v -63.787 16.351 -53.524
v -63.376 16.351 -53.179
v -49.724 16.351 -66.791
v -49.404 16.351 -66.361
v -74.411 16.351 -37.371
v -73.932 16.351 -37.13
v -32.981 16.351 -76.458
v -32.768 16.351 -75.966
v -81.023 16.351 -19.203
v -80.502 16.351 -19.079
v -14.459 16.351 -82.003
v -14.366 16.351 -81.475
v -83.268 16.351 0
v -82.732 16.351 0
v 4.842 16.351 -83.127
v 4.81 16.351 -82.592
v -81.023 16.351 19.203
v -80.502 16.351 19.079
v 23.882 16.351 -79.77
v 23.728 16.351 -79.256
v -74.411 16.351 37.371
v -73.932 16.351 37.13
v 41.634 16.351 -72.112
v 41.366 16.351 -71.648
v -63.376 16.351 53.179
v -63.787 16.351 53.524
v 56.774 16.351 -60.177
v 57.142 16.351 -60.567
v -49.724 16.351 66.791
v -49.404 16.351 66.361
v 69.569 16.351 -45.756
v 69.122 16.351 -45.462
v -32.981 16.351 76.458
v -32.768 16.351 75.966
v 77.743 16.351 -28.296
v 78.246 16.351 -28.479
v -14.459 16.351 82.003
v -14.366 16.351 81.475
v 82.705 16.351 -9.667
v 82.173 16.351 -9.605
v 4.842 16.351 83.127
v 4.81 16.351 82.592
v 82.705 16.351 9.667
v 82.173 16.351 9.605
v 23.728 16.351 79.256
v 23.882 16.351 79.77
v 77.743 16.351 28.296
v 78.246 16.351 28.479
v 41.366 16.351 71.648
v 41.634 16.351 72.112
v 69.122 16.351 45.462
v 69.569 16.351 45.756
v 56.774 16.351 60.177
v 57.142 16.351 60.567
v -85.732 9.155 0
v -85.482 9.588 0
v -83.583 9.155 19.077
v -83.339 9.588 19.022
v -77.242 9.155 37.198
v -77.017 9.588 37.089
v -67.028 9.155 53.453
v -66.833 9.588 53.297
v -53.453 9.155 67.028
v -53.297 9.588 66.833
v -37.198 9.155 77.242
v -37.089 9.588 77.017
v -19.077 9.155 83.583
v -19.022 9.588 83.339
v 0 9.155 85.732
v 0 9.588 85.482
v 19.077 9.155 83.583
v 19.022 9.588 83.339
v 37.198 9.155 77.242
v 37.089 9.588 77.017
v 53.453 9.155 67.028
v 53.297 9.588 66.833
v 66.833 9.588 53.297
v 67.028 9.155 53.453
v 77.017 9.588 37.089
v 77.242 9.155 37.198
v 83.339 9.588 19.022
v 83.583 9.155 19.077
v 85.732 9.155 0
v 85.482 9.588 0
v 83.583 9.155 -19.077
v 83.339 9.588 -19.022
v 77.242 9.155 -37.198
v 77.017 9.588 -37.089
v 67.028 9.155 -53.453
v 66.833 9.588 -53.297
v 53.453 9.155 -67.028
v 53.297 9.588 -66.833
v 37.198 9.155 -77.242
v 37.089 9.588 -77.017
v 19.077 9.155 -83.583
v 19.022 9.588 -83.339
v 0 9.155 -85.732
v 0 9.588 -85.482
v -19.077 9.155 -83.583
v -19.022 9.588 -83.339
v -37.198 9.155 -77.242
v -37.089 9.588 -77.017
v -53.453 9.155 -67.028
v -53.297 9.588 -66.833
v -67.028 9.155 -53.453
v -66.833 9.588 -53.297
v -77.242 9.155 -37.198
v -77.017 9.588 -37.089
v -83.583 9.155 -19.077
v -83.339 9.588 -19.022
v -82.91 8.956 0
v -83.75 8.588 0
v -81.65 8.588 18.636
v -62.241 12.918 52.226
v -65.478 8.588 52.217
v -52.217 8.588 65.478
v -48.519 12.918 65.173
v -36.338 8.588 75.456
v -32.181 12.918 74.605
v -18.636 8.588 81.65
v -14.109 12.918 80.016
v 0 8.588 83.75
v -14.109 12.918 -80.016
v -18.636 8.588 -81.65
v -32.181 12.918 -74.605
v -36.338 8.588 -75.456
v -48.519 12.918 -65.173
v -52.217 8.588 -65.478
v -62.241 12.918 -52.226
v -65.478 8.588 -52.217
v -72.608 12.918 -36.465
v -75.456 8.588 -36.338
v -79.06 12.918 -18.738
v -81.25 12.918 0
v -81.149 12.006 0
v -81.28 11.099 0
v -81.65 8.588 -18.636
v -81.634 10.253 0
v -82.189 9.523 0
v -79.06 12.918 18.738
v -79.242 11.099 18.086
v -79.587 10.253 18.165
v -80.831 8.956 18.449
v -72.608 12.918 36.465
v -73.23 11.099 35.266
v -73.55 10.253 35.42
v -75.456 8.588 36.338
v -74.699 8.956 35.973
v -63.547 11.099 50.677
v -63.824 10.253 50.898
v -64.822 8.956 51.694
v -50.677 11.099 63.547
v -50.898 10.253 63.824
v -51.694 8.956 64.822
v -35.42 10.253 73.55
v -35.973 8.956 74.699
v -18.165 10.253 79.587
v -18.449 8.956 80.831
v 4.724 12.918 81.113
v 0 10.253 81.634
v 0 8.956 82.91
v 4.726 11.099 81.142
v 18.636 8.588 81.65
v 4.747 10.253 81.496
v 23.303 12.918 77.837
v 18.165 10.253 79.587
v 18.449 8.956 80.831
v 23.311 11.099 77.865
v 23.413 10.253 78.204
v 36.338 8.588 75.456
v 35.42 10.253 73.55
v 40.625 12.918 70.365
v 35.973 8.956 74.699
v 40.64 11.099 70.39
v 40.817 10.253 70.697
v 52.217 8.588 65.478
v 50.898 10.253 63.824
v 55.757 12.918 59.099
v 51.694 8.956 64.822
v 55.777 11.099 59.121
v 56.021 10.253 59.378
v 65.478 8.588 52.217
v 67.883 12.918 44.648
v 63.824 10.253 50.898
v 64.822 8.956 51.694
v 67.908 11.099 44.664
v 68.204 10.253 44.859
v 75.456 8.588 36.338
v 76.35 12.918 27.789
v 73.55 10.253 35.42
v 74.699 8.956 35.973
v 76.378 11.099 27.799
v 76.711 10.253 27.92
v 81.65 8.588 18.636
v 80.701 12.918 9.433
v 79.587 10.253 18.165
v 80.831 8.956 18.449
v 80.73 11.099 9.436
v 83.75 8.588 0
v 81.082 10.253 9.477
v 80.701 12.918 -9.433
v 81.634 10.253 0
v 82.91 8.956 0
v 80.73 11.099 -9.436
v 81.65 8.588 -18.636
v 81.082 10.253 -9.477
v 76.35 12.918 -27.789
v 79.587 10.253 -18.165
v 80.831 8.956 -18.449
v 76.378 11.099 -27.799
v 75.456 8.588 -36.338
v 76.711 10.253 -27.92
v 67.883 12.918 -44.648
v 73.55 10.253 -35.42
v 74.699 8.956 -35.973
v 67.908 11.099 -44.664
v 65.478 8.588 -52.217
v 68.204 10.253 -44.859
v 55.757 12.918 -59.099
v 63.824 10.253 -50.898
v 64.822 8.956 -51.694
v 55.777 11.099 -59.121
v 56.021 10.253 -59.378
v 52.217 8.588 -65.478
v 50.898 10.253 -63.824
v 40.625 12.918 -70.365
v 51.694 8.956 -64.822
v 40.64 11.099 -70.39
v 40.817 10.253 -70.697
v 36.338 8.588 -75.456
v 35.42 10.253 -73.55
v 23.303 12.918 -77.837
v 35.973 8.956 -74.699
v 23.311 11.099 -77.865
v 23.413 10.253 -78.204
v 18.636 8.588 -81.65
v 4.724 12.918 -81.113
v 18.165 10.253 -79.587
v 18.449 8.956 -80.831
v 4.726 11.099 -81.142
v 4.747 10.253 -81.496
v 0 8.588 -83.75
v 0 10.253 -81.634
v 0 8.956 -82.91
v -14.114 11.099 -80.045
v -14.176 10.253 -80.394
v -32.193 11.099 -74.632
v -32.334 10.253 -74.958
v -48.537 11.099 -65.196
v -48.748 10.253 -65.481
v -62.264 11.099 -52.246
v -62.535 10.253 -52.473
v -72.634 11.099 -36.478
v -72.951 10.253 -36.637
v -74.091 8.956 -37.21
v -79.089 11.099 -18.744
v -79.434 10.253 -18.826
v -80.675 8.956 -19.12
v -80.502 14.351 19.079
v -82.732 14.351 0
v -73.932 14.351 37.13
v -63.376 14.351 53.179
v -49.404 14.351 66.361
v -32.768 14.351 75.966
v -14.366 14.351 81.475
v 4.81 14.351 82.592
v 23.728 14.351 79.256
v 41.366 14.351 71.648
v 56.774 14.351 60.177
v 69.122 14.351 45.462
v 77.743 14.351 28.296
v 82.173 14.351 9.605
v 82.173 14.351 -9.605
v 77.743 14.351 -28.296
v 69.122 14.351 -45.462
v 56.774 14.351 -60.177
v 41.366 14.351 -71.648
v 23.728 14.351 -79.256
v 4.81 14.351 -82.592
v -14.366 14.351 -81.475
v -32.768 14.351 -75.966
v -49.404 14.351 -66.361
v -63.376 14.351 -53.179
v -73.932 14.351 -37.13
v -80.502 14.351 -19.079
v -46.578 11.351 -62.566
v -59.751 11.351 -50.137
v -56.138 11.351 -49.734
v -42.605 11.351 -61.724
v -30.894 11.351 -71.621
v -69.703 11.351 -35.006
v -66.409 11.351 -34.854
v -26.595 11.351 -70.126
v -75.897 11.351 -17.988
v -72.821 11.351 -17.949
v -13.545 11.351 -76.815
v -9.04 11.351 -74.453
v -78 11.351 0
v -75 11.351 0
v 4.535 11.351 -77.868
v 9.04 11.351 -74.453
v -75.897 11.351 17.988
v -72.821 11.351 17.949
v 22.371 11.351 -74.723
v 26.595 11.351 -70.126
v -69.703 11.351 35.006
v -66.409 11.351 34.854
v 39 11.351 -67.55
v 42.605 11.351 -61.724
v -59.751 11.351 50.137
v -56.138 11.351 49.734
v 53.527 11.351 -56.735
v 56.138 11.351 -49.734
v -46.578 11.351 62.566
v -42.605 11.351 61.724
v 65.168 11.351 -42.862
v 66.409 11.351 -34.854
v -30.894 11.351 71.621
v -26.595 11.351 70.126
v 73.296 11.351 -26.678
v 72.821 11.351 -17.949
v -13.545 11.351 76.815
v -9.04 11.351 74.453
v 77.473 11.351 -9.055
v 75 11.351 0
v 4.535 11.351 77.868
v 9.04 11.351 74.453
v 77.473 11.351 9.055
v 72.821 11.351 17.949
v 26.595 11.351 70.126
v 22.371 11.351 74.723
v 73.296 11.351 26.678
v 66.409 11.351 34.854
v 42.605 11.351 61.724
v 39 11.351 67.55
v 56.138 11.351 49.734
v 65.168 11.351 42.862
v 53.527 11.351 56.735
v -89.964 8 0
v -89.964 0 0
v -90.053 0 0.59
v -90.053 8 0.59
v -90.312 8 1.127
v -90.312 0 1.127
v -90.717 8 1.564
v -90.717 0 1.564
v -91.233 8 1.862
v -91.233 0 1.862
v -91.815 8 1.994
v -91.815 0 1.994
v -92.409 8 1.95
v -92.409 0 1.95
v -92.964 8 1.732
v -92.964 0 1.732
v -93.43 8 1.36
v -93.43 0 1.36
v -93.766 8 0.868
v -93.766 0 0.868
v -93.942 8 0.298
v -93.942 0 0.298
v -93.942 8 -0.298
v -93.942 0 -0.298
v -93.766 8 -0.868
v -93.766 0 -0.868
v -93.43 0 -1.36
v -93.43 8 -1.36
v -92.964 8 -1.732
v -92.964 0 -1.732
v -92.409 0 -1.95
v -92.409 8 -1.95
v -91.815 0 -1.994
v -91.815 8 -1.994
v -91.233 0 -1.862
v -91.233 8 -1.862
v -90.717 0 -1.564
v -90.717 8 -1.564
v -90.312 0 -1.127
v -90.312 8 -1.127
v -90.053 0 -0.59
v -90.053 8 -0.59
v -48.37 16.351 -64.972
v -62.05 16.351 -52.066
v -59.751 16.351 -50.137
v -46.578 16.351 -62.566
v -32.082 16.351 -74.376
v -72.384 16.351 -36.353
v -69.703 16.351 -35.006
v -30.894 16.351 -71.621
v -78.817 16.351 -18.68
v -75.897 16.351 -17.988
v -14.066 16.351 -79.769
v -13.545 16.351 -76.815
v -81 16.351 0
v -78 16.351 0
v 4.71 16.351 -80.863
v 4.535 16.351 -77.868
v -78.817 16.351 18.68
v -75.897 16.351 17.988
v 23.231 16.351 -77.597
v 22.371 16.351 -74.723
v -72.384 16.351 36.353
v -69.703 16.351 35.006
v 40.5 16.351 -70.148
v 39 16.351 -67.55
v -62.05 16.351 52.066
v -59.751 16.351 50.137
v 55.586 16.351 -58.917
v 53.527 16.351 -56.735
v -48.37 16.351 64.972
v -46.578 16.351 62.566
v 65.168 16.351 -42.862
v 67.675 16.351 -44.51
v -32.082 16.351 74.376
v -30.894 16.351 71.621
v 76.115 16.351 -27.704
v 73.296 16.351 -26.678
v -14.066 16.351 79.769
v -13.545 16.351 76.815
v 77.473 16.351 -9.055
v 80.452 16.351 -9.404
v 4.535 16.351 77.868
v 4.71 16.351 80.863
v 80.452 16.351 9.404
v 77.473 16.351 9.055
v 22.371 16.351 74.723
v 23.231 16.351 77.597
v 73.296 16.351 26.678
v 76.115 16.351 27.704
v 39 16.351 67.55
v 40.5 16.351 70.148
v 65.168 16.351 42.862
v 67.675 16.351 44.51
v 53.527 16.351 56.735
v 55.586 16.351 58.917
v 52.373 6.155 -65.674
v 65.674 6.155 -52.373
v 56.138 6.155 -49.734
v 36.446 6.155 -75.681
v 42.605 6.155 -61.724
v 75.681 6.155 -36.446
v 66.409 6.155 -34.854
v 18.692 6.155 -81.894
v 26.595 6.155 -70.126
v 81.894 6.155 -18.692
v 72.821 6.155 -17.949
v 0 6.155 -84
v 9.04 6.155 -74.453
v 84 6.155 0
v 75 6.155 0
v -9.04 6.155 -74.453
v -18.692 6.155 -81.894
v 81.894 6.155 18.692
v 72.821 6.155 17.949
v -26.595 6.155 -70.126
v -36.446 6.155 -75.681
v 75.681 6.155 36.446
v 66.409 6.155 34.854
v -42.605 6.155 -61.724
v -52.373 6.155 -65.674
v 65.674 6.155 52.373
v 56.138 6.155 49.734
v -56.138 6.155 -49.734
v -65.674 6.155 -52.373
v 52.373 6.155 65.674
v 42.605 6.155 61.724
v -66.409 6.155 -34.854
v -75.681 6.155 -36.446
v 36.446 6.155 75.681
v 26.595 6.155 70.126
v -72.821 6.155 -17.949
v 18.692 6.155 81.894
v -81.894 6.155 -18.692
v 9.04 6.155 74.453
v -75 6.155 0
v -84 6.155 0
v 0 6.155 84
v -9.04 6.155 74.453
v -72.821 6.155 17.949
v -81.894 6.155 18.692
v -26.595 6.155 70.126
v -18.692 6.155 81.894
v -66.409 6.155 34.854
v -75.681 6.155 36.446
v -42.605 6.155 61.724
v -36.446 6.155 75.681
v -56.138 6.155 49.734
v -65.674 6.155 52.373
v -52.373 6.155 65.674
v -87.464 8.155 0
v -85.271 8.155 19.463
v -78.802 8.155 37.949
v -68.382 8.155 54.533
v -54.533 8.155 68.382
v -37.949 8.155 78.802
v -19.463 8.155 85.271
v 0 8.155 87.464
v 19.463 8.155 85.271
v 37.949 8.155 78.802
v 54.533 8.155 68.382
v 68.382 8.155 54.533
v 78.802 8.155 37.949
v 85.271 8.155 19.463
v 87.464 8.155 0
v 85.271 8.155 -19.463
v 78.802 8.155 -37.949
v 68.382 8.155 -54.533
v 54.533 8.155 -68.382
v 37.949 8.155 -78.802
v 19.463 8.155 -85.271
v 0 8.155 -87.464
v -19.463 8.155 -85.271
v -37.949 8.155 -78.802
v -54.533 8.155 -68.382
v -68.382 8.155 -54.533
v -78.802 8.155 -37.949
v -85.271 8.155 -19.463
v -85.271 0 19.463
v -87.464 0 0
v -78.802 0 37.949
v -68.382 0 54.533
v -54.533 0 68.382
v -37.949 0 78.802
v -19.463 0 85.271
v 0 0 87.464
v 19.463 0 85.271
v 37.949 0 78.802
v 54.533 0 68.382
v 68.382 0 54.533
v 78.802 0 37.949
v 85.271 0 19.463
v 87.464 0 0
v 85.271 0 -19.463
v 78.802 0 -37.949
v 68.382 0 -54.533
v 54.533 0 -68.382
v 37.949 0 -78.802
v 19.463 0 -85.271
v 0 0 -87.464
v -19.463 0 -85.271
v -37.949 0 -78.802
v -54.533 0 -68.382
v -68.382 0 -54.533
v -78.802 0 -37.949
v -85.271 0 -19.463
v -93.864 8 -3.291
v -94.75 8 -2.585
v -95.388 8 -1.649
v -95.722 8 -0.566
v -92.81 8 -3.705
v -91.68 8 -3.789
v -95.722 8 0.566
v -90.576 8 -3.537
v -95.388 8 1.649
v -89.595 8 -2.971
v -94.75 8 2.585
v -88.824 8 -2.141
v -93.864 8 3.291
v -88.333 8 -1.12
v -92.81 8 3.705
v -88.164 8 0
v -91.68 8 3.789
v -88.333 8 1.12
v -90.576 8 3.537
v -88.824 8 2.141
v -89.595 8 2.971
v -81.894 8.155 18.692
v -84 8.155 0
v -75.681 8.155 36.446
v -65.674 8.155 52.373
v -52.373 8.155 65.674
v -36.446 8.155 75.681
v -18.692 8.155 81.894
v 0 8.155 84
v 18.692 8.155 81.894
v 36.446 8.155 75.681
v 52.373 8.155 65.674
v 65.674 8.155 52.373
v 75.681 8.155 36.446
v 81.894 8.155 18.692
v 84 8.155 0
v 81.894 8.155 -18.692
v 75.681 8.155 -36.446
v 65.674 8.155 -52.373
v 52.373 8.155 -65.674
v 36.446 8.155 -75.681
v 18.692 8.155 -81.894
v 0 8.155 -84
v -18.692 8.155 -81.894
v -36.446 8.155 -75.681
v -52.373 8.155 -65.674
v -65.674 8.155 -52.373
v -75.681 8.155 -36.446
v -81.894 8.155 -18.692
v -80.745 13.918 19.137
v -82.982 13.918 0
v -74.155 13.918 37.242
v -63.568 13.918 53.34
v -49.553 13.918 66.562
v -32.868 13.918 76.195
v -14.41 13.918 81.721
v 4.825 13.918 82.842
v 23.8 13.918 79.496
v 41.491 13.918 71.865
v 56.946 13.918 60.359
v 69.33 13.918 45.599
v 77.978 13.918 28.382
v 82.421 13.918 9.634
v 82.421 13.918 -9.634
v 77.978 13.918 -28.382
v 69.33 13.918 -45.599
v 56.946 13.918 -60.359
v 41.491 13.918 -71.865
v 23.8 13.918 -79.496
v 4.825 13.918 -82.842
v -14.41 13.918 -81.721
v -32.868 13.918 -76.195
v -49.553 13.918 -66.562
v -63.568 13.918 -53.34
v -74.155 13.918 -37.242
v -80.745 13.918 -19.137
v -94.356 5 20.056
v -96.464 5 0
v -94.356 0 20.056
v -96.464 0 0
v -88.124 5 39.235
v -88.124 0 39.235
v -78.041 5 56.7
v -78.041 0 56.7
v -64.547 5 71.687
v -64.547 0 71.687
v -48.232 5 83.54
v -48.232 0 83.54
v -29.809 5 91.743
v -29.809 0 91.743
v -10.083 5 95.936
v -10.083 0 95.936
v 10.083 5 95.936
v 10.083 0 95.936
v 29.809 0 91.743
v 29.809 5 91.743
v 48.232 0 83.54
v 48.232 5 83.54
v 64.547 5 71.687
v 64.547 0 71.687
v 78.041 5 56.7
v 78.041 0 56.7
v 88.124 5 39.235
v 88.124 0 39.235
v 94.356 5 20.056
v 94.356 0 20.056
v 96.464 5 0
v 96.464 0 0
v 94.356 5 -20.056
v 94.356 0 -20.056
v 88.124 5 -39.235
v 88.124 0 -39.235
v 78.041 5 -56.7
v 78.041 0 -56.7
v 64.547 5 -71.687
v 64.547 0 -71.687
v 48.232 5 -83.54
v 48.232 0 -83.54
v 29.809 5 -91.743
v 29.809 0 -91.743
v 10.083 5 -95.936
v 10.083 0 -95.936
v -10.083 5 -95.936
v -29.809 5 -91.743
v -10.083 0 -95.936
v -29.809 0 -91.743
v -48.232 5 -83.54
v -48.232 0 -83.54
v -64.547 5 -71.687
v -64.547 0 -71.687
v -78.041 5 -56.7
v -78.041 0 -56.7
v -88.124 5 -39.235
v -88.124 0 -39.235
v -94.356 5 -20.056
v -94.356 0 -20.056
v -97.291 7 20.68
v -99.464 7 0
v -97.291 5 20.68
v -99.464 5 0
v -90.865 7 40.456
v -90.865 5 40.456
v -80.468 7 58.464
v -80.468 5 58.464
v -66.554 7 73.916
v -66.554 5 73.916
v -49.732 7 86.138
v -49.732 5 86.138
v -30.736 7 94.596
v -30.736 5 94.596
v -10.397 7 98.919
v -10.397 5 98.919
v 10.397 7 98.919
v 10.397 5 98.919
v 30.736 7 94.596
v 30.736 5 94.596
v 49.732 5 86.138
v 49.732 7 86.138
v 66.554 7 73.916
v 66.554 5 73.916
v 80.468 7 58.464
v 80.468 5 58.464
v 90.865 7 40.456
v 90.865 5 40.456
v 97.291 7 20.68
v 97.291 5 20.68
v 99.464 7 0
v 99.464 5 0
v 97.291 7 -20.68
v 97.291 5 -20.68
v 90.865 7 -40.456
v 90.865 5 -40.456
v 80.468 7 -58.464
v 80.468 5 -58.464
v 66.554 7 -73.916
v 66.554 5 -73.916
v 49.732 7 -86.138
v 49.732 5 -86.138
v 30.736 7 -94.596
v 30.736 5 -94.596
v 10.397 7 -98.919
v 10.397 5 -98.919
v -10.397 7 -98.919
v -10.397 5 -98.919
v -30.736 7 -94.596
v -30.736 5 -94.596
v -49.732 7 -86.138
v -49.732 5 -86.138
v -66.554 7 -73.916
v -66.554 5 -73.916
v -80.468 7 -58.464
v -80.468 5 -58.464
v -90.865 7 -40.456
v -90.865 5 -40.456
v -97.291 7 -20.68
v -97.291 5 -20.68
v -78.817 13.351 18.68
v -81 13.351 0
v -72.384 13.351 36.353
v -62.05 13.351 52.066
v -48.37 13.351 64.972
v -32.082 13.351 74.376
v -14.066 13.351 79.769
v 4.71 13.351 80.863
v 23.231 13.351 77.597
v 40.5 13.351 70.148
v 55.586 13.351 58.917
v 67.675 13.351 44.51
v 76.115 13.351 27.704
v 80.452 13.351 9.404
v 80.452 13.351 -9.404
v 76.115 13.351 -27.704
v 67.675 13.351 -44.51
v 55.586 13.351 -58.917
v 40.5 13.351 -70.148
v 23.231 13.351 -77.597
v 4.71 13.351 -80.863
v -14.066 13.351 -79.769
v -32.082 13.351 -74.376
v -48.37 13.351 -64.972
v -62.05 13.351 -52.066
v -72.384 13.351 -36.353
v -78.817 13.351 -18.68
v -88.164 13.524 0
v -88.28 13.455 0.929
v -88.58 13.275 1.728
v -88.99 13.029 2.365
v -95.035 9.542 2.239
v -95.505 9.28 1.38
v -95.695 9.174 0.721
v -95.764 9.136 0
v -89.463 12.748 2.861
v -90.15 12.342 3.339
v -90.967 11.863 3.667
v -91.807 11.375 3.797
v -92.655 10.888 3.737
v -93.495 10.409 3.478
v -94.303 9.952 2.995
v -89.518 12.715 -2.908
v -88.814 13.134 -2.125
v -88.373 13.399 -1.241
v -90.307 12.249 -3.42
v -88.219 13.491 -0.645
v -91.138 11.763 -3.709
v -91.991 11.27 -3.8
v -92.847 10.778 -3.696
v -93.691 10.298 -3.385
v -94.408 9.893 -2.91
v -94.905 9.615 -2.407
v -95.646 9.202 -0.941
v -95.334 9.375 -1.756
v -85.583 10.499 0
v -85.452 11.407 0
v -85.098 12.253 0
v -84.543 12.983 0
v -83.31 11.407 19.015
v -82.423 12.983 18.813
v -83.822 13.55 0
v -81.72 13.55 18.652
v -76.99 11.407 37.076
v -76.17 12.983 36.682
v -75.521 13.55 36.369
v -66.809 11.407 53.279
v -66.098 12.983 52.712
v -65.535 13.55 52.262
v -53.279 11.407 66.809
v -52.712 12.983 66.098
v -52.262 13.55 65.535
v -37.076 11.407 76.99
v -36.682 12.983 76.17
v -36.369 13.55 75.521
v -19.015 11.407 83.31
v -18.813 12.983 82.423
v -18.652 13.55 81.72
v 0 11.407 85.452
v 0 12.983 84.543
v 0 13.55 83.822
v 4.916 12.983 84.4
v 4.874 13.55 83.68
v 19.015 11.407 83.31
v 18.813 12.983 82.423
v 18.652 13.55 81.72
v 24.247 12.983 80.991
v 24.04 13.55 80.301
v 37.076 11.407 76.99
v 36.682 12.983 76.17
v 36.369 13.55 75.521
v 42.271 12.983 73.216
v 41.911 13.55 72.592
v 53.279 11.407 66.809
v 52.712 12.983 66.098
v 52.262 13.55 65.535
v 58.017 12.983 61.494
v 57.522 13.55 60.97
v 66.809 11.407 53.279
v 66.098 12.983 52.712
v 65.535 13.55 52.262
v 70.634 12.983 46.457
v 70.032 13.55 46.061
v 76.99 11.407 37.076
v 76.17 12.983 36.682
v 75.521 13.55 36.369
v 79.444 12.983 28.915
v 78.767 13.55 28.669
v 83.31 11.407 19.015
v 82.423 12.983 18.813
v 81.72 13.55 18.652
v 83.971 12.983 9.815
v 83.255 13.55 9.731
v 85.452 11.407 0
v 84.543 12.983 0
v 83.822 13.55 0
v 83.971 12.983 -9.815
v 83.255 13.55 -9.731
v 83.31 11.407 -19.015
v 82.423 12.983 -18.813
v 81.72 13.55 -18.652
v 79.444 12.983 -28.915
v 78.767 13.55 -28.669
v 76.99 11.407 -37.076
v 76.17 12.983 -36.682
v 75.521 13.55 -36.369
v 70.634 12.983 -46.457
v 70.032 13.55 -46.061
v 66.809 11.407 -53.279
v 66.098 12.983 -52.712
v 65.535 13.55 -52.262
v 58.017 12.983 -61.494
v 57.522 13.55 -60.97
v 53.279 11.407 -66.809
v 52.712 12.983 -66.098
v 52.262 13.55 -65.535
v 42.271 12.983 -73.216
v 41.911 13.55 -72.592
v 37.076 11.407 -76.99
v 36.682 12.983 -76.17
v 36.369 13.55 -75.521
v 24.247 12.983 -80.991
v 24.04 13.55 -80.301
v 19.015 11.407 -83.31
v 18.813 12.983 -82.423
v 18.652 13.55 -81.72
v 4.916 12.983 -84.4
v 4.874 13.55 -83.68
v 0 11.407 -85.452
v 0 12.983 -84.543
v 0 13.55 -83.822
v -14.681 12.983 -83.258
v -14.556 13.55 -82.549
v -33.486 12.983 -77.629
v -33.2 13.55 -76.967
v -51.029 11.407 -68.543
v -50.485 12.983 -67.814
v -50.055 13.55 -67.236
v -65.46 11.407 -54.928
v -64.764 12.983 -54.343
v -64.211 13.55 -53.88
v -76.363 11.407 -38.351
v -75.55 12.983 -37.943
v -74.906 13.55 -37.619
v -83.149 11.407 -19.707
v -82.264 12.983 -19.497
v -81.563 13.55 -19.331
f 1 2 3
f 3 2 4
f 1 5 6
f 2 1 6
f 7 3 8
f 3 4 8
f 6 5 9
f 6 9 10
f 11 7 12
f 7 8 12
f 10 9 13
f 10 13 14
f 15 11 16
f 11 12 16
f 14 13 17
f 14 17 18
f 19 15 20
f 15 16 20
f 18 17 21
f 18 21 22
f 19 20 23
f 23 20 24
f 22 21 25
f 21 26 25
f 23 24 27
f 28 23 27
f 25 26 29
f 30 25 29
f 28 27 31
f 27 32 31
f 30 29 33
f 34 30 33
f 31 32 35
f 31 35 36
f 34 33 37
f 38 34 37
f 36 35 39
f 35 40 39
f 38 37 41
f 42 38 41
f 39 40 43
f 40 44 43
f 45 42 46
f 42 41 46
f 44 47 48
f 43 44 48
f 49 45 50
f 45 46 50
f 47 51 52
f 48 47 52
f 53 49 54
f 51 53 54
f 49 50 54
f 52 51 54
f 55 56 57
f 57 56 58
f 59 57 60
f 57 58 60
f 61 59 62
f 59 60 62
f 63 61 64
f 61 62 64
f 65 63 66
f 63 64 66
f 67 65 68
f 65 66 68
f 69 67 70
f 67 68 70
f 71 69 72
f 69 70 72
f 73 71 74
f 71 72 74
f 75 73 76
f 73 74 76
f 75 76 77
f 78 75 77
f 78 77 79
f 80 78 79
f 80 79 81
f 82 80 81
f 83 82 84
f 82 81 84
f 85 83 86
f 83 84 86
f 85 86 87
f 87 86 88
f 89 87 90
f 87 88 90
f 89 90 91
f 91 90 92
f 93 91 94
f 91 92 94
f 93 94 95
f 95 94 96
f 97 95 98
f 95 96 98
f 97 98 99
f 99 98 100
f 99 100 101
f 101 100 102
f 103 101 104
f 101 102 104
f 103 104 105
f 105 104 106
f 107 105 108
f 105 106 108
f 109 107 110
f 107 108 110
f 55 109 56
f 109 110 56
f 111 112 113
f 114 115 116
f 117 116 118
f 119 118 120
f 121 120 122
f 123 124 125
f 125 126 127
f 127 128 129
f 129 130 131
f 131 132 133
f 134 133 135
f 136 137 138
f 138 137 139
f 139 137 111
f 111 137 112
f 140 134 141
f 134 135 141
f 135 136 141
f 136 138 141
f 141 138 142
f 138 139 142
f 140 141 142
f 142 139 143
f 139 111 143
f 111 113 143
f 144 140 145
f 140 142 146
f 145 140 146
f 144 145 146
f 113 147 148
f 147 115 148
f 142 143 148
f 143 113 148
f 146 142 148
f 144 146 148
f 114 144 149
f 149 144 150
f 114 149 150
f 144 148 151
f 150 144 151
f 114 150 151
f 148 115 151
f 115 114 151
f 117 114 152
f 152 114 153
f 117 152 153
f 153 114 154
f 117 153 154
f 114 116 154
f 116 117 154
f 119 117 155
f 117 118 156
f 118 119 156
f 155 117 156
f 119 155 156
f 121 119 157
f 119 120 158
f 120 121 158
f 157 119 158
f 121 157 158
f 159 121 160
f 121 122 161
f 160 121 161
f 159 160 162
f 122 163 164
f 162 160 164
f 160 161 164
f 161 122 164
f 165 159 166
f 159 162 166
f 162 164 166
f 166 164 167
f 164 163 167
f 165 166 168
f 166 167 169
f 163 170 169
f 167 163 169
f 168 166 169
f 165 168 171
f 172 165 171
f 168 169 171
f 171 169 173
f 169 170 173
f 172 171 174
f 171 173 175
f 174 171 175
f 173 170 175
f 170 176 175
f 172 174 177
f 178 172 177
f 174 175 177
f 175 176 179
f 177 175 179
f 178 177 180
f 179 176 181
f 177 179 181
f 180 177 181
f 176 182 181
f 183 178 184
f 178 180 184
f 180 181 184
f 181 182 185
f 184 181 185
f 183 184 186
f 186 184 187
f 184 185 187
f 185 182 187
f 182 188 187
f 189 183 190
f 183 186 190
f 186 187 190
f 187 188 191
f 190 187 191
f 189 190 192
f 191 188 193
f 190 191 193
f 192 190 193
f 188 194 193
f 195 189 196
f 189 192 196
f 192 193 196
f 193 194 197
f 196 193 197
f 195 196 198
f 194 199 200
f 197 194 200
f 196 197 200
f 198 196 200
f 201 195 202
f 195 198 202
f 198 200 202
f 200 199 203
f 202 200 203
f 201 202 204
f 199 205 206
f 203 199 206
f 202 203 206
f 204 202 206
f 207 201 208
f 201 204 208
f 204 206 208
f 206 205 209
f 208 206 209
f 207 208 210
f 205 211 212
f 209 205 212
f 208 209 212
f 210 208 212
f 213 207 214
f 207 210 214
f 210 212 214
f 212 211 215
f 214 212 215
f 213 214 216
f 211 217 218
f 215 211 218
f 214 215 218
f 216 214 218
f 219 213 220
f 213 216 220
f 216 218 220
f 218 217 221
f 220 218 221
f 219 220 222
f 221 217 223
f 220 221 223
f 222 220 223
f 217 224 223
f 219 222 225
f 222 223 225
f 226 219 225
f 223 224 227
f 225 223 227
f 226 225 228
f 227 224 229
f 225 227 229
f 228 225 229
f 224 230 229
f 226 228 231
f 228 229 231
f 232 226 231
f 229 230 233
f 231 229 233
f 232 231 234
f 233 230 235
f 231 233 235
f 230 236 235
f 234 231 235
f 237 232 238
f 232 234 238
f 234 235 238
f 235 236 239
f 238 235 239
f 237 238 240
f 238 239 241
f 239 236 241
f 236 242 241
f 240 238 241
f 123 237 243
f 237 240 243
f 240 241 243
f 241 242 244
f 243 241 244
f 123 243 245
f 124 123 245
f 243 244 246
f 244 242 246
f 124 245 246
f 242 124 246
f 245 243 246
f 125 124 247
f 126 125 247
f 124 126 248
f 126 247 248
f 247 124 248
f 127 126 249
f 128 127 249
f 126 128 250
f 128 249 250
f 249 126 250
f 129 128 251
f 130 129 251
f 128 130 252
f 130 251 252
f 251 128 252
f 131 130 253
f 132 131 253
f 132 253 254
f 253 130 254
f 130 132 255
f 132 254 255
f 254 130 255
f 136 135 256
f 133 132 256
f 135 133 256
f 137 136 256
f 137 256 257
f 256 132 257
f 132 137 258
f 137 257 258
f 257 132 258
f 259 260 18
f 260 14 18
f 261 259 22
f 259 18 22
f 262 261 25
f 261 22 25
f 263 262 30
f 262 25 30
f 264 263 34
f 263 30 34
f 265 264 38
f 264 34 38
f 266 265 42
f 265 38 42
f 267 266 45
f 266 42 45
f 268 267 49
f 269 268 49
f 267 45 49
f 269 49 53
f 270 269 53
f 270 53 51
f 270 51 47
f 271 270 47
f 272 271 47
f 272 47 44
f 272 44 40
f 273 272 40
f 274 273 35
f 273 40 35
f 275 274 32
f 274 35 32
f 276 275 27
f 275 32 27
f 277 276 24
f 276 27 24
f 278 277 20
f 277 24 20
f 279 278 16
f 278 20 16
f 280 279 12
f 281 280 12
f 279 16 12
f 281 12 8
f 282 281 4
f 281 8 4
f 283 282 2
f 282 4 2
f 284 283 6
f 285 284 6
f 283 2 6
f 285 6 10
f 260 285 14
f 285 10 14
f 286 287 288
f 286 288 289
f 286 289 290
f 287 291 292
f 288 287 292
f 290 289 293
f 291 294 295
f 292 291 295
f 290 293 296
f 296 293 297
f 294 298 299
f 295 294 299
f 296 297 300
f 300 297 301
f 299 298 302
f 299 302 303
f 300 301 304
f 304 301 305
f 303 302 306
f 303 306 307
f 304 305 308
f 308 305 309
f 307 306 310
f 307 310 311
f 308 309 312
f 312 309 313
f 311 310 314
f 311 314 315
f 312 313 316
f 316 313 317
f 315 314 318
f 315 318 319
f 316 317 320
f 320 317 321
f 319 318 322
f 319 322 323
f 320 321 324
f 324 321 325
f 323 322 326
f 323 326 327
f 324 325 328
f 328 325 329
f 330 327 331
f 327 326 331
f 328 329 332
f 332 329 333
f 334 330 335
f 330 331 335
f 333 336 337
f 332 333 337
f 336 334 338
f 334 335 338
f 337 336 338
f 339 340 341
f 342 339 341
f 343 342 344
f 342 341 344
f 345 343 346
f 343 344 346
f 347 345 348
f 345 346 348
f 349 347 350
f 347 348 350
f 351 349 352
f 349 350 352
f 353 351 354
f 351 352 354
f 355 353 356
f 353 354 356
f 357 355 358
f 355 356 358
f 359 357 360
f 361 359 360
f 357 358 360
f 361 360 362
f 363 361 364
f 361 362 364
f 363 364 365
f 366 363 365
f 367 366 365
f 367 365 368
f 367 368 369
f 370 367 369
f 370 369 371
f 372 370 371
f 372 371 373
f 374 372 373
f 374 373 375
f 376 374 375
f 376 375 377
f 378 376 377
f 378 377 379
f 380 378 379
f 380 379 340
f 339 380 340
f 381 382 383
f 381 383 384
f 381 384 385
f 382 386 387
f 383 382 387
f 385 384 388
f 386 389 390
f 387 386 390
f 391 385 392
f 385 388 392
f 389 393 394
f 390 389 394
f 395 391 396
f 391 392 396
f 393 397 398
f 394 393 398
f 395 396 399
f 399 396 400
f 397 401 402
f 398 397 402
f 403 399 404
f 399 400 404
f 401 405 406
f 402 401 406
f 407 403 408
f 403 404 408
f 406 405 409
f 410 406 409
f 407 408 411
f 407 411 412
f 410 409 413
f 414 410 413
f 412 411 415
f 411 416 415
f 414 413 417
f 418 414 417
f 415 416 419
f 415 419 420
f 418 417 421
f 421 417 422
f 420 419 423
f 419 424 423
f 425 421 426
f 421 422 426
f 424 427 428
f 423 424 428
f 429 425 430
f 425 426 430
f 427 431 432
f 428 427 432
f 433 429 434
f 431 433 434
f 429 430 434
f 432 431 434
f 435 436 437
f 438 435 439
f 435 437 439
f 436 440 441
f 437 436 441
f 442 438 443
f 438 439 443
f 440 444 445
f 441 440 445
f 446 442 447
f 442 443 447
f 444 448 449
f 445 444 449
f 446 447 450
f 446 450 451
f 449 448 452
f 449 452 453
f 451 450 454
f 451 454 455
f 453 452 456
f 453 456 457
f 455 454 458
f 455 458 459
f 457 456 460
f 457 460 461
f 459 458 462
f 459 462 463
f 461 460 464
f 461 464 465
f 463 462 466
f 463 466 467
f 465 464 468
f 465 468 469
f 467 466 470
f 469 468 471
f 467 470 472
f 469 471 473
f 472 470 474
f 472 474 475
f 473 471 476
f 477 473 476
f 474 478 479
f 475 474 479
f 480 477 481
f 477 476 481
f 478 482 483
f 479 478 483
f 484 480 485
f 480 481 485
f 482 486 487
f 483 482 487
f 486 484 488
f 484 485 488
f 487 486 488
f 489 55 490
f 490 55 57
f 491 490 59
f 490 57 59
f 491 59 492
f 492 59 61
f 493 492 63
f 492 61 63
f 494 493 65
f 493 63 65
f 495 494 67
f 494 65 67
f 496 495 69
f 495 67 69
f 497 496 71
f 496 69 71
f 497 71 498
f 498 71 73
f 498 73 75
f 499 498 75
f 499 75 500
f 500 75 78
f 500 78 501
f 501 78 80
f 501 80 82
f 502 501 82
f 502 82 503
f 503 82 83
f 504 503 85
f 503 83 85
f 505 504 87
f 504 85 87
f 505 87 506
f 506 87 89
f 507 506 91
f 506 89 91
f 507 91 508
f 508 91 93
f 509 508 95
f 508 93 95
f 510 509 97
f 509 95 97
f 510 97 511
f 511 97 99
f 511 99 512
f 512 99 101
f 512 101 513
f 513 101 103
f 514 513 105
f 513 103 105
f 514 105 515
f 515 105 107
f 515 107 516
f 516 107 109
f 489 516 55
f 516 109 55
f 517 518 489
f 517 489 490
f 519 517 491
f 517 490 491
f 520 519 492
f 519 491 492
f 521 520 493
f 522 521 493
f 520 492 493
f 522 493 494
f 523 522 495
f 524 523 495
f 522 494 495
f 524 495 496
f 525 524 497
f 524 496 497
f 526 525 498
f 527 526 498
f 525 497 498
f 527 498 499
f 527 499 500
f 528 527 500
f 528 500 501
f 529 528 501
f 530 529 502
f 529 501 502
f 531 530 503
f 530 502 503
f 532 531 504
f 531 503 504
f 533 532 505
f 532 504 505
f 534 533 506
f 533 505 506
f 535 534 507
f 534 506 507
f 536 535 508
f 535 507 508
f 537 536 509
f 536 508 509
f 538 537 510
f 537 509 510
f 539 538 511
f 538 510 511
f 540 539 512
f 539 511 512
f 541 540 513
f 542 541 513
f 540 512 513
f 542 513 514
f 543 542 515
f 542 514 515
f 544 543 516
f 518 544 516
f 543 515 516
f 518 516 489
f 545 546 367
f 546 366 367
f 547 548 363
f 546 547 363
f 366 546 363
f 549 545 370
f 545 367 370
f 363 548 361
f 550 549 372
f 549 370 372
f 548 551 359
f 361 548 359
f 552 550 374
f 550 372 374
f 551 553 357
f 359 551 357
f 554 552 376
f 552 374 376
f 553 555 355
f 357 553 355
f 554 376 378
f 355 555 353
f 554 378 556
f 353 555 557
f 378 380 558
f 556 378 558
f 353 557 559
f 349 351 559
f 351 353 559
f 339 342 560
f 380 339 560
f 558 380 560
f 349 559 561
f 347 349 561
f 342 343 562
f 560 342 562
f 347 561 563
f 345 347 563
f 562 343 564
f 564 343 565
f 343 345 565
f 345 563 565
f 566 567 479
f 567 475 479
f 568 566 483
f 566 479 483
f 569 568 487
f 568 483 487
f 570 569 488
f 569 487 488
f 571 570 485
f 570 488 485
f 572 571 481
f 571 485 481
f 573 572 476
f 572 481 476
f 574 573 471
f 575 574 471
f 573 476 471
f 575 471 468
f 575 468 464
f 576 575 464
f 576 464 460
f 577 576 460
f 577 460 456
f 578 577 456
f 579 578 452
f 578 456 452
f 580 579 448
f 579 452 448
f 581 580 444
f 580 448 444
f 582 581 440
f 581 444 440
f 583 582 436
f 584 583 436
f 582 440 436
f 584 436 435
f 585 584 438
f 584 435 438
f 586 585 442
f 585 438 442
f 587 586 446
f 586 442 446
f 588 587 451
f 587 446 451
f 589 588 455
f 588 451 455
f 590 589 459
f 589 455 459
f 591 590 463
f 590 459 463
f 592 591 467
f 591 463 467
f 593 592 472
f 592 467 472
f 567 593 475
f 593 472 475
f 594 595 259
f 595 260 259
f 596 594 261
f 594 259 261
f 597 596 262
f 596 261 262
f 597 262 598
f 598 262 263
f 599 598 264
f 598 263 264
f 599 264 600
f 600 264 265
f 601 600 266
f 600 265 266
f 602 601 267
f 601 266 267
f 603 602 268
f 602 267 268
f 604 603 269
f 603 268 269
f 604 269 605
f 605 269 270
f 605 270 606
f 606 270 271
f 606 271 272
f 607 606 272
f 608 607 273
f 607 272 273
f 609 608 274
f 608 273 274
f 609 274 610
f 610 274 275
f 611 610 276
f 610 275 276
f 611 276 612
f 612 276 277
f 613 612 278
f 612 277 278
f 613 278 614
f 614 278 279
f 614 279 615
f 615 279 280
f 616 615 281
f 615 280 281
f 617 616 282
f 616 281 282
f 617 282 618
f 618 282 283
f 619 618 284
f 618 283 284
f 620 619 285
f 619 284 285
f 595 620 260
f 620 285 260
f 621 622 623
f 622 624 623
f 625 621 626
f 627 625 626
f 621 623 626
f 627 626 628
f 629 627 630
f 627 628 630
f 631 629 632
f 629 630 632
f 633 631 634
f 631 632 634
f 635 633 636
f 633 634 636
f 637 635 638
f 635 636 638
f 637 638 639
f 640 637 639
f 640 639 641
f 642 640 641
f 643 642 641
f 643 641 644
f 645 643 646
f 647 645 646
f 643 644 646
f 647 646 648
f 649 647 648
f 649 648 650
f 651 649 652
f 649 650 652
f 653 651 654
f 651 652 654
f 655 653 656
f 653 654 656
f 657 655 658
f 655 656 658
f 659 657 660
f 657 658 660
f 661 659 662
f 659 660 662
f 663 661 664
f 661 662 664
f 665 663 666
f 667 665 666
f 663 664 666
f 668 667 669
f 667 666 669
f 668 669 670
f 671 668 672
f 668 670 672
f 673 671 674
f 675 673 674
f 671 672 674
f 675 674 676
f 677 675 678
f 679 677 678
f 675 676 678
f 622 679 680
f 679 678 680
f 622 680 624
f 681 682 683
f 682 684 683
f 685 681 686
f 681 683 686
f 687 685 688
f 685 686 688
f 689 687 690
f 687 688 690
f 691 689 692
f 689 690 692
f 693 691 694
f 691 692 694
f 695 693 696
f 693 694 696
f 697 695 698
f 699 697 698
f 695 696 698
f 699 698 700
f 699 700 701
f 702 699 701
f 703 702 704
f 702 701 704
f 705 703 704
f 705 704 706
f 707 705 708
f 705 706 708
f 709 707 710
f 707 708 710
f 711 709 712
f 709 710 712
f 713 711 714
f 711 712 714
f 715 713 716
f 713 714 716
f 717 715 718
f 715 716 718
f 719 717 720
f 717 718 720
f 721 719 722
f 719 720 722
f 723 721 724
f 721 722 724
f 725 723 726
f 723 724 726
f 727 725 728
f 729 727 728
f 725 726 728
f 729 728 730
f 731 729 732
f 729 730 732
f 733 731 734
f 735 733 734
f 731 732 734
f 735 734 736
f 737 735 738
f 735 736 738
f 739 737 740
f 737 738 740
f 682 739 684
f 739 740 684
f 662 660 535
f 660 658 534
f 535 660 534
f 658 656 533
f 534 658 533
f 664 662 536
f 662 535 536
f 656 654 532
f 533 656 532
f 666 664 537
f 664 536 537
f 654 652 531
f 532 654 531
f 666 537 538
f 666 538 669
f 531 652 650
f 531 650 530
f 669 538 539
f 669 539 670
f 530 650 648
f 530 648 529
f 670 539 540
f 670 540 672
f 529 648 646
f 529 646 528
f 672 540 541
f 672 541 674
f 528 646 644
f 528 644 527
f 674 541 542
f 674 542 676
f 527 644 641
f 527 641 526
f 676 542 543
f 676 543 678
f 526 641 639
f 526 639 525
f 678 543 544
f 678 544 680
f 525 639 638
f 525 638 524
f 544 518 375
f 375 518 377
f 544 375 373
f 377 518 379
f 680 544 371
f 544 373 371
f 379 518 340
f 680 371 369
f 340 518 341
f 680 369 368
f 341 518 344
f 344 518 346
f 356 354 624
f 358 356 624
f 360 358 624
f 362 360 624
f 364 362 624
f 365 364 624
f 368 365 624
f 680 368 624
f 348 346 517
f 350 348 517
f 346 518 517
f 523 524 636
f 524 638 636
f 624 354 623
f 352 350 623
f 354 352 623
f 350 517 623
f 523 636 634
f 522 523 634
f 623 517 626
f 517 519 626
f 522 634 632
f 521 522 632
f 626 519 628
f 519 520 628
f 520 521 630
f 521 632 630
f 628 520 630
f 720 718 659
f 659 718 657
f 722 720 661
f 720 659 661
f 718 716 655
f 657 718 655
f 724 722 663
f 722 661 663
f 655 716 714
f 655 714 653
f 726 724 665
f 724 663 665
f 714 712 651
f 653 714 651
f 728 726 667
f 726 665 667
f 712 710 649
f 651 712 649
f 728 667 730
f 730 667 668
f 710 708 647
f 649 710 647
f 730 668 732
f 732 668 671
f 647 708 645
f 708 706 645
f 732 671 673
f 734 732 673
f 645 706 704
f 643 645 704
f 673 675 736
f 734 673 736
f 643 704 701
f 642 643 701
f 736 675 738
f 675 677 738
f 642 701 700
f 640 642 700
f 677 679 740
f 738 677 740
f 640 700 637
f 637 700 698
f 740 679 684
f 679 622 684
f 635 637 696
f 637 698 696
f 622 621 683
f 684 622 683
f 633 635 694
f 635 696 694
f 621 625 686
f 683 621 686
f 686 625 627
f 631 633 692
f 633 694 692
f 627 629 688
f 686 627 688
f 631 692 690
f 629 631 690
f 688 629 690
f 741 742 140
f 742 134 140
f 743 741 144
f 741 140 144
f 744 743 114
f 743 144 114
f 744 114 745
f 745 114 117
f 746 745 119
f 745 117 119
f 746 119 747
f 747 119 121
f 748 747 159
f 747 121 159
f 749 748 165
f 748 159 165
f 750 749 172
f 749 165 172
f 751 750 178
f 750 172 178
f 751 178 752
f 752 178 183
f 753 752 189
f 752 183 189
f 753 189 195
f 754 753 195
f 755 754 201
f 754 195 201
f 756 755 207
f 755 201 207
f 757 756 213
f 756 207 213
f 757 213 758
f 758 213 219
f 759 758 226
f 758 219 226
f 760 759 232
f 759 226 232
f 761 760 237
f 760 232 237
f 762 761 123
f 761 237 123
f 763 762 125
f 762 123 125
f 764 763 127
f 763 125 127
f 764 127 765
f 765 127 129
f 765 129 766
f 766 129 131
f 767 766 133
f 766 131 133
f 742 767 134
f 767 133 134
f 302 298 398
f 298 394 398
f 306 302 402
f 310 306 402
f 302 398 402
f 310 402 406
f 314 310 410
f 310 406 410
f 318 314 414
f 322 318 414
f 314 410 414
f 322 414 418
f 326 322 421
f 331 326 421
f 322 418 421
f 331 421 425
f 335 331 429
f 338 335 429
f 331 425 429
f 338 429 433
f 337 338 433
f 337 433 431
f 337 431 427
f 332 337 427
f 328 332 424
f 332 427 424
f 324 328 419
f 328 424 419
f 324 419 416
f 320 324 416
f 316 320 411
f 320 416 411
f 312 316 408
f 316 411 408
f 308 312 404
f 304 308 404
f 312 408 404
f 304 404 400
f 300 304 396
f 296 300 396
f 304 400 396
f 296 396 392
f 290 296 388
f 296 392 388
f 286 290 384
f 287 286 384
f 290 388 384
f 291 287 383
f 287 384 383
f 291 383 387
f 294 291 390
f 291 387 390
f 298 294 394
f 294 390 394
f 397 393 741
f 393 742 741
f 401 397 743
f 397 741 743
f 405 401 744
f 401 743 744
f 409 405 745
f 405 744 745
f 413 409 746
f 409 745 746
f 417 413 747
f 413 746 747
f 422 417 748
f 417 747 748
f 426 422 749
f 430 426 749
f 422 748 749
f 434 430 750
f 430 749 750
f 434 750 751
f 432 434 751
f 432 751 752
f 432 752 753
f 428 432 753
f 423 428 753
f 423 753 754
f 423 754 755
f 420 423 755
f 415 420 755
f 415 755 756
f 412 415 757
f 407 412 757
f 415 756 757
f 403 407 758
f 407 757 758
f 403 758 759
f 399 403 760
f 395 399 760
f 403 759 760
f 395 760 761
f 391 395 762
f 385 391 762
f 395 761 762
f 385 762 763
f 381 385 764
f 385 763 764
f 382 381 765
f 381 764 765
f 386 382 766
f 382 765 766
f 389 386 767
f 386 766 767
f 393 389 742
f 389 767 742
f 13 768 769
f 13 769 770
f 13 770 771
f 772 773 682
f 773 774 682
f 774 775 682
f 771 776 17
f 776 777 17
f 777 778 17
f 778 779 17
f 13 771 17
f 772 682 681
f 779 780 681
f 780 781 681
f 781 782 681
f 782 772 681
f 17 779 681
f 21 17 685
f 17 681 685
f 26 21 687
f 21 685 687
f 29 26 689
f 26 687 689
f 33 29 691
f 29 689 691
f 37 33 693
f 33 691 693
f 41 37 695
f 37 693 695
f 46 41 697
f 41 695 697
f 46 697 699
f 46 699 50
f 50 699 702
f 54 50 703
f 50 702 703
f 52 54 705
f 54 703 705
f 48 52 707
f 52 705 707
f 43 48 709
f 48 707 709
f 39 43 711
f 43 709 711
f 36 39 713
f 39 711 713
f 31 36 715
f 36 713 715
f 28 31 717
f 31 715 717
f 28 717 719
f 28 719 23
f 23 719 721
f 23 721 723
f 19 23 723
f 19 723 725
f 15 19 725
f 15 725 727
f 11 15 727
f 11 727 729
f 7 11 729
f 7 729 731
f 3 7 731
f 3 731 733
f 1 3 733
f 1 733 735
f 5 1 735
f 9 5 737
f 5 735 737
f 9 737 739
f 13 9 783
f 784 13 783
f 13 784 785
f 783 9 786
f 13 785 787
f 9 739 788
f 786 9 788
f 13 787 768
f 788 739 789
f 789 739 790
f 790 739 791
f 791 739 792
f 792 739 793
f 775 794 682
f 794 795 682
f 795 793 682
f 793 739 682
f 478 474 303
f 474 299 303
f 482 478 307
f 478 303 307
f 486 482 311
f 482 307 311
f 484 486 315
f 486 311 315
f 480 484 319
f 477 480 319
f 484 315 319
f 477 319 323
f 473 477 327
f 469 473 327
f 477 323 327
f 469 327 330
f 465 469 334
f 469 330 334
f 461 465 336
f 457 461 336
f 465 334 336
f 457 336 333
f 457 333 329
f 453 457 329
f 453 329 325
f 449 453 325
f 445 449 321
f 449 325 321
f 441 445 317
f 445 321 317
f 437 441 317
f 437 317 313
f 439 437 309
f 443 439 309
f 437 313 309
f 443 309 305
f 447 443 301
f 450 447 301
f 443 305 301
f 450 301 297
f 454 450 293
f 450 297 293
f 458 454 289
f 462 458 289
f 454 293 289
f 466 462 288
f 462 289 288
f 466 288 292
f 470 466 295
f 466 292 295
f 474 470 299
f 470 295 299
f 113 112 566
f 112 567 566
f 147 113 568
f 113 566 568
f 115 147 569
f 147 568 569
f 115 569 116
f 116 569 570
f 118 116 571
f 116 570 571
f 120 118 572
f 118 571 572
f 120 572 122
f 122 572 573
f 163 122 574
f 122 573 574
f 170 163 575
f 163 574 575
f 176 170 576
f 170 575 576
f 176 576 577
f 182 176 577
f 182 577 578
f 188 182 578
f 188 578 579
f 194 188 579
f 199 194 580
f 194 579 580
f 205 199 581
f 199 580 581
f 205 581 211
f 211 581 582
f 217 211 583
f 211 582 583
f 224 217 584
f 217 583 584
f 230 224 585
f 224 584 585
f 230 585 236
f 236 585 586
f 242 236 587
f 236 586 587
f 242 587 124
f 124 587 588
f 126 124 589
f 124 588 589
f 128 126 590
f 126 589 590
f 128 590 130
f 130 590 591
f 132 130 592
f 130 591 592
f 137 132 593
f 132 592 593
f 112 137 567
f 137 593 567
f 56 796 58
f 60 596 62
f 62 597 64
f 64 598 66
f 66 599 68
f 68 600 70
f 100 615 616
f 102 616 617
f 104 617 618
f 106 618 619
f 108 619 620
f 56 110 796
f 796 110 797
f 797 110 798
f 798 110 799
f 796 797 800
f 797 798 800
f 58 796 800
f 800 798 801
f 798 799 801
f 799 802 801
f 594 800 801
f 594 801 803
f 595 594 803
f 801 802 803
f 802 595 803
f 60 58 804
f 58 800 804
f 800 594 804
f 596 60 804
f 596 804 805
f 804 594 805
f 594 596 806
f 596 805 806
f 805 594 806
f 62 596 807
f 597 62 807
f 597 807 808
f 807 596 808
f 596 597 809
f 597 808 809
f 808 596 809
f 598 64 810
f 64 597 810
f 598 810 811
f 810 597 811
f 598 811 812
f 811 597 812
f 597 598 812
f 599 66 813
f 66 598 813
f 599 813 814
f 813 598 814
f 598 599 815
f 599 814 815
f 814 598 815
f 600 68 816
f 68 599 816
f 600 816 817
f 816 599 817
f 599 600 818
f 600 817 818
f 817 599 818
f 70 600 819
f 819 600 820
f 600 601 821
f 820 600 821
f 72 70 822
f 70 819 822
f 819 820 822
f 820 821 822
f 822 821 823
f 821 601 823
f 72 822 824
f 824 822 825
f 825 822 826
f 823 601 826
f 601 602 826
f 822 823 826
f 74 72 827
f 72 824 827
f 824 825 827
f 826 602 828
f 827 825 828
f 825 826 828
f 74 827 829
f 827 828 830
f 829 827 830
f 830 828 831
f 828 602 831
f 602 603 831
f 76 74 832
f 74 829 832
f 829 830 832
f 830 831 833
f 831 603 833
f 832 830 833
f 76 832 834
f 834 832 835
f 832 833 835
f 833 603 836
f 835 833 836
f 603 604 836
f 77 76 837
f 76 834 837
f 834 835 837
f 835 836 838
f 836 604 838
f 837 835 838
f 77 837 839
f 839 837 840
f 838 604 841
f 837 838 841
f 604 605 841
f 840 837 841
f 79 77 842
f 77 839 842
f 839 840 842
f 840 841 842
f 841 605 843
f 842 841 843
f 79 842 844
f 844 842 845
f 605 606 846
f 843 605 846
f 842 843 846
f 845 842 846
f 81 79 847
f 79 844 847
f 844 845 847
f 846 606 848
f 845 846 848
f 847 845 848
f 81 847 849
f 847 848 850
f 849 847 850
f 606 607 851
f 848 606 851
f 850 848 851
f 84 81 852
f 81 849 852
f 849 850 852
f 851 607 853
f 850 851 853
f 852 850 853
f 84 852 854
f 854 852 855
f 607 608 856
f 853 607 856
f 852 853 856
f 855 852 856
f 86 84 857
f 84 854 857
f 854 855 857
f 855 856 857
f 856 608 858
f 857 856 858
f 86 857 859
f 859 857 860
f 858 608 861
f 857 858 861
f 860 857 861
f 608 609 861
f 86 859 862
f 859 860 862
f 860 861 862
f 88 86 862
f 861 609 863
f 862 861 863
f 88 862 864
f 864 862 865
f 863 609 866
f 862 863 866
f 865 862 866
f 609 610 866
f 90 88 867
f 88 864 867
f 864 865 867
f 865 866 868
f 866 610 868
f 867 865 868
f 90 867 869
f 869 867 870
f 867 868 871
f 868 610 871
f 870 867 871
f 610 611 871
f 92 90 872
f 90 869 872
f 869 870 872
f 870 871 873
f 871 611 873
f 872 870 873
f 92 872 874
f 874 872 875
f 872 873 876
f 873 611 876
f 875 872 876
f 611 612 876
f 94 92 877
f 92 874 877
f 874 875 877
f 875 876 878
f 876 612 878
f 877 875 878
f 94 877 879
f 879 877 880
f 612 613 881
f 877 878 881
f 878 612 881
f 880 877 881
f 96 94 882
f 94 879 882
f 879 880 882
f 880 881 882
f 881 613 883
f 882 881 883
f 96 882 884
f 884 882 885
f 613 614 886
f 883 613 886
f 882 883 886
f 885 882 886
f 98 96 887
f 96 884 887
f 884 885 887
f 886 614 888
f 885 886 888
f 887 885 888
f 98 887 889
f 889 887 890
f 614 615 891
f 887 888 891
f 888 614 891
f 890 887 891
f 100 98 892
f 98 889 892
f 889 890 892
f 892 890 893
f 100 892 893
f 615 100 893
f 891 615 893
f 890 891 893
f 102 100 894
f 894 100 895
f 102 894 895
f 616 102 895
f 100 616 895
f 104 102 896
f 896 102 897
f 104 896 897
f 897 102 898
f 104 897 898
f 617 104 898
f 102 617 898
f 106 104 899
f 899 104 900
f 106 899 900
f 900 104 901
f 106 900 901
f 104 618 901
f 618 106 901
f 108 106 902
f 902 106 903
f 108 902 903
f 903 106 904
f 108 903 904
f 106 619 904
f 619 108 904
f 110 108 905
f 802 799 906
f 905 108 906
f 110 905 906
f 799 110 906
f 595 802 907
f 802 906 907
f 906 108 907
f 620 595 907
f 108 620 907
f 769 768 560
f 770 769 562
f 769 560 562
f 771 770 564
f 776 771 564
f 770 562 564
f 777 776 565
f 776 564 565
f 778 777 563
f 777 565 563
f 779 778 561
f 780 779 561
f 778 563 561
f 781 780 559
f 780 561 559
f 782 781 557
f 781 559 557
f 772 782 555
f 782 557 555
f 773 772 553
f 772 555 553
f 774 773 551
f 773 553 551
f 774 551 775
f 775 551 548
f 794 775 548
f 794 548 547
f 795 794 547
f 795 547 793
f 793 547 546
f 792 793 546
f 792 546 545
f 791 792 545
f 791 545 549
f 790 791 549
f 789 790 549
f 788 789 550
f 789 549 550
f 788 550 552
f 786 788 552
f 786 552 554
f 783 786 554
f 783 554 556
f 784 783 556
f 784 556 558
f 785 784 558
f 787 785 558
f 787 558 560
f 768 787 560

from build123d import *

# Parameters (mm, degrees)
CUT_EXTRUDE1_REACH = 143.611
SKETCH2_R          = 2
CUT_EXTRUDE5_START = -8
SKETCH2_3_R        = 3.8
CUT_EXTRUDE5_DEPTH = 10


with BuildPart() as part:
    # Sketch1 → Revolve1 (revolve)
    with BuildSketch(Plane.XY):
        with BuildLine():
            Line((-83.267949192, 16.350852961), (-99.464101615, 7))
            Line((-99.464101615, 7), (-99.464101615, 5))
            Line((-99.464101615, 5), (-96.464101615, 5))
            Line((-96.464101615, 5), (-96.464101615, 0))
            Line((-96.464101615, 0), (-87.464101615, 0))
            Line((-87.464101615, 0), (-87.464101615, 8.154700538))
            Line((-87.464101615, 8.154700538), (-85.732050808, 9.154700538))
            Line((-85.732050808, 9.154700538), (-85.482050808, 9.58771324))
            ThreePointArc((-85.482050808, 9.58771324), (-85.098076211, 12.25277675), (-82.982050808, 13.917840259))
            Line((-82.982050808, 13.917840259), (-82.732050808, 14.350852961))
            Line((-82.732050808, 14.350852961), (-82.732050808, 16.350852961))
            Line((-82.732050808, 16.350852961), (-83.267949192, 16.350852961))
        make_face()
    revolve(axis=Axis((0, 0, 0), (0, 1, 0)))

    # Sketch2 → Cut-Extrude1 (cut, up to next)
    with BuildSketch(Plane.XZ, mode=Mode.PRIVATE) as cut_extrude1_sk1:
        with Locations((-91.964101615, 0)):
            Circle(SKETCH2_R)
    cut_extrude1_tool1 = extrude(cut_extrude1_sk1.sketch, amount=-CUT_EXTRUDE1_REACH, mode=Mode.PRIVATE) & part.part
    add(cut_extrude1_tool1.solids().sort_by_distance((-91.964102, 0, 0))[0], mode=Mode.SUBTRACT)

    # Sketch2<3> → Cut-Extrude5 (cut)
    with BuildSketch(Plane.XZ.offset(CUT_EXTRUDE5_START)):
        with Locations((-91.964101615, 0)):
            Circle(SKETCH2_3_R)
    extrude(amount=-CUT_EXTRUDE5_DEPTH, mode=Mode.SUBTRACT)


with BuildPart() as body_2:
    # Sketch1<3> → Revolve2 (revolve)
    with BuildSketch(Plane.XY):
        with BuildLine():
            Line((-83.75, 8.58771324), (-84, 8.154700538))
            Line((-84, 8.154700538), (-84, 6.154700538))
            Line((-84, 6.154700538), (-75, 6.154700538))
            Line((-75, 6.154700538), (-75, 11.350852961))
            Line((-75, 11.350852961), (-77.8, 11.350852961))
            Line((-77.8, 11.350852961), (-78, 11.350852961))
            Line((-78, 11.350852961), (-78, 16.350852961))
            Line((-78, 16.350852961), (-81, 16.350852961))
            Line((-81, 16.350852961), (-81, 13.350852961))
            Line((-81, 13.350852961), (-81.25, 12.917840259))
            ThreePointArc((-81.25, 12.917840259), (-81.633974596, 10.25277675), (-83.75, 8.58771324))
        make_face()
    revolve(axis=Axis((0, 0, 0), (0, 1, 0)))


solid = Compound([part.part, body_2.part])
